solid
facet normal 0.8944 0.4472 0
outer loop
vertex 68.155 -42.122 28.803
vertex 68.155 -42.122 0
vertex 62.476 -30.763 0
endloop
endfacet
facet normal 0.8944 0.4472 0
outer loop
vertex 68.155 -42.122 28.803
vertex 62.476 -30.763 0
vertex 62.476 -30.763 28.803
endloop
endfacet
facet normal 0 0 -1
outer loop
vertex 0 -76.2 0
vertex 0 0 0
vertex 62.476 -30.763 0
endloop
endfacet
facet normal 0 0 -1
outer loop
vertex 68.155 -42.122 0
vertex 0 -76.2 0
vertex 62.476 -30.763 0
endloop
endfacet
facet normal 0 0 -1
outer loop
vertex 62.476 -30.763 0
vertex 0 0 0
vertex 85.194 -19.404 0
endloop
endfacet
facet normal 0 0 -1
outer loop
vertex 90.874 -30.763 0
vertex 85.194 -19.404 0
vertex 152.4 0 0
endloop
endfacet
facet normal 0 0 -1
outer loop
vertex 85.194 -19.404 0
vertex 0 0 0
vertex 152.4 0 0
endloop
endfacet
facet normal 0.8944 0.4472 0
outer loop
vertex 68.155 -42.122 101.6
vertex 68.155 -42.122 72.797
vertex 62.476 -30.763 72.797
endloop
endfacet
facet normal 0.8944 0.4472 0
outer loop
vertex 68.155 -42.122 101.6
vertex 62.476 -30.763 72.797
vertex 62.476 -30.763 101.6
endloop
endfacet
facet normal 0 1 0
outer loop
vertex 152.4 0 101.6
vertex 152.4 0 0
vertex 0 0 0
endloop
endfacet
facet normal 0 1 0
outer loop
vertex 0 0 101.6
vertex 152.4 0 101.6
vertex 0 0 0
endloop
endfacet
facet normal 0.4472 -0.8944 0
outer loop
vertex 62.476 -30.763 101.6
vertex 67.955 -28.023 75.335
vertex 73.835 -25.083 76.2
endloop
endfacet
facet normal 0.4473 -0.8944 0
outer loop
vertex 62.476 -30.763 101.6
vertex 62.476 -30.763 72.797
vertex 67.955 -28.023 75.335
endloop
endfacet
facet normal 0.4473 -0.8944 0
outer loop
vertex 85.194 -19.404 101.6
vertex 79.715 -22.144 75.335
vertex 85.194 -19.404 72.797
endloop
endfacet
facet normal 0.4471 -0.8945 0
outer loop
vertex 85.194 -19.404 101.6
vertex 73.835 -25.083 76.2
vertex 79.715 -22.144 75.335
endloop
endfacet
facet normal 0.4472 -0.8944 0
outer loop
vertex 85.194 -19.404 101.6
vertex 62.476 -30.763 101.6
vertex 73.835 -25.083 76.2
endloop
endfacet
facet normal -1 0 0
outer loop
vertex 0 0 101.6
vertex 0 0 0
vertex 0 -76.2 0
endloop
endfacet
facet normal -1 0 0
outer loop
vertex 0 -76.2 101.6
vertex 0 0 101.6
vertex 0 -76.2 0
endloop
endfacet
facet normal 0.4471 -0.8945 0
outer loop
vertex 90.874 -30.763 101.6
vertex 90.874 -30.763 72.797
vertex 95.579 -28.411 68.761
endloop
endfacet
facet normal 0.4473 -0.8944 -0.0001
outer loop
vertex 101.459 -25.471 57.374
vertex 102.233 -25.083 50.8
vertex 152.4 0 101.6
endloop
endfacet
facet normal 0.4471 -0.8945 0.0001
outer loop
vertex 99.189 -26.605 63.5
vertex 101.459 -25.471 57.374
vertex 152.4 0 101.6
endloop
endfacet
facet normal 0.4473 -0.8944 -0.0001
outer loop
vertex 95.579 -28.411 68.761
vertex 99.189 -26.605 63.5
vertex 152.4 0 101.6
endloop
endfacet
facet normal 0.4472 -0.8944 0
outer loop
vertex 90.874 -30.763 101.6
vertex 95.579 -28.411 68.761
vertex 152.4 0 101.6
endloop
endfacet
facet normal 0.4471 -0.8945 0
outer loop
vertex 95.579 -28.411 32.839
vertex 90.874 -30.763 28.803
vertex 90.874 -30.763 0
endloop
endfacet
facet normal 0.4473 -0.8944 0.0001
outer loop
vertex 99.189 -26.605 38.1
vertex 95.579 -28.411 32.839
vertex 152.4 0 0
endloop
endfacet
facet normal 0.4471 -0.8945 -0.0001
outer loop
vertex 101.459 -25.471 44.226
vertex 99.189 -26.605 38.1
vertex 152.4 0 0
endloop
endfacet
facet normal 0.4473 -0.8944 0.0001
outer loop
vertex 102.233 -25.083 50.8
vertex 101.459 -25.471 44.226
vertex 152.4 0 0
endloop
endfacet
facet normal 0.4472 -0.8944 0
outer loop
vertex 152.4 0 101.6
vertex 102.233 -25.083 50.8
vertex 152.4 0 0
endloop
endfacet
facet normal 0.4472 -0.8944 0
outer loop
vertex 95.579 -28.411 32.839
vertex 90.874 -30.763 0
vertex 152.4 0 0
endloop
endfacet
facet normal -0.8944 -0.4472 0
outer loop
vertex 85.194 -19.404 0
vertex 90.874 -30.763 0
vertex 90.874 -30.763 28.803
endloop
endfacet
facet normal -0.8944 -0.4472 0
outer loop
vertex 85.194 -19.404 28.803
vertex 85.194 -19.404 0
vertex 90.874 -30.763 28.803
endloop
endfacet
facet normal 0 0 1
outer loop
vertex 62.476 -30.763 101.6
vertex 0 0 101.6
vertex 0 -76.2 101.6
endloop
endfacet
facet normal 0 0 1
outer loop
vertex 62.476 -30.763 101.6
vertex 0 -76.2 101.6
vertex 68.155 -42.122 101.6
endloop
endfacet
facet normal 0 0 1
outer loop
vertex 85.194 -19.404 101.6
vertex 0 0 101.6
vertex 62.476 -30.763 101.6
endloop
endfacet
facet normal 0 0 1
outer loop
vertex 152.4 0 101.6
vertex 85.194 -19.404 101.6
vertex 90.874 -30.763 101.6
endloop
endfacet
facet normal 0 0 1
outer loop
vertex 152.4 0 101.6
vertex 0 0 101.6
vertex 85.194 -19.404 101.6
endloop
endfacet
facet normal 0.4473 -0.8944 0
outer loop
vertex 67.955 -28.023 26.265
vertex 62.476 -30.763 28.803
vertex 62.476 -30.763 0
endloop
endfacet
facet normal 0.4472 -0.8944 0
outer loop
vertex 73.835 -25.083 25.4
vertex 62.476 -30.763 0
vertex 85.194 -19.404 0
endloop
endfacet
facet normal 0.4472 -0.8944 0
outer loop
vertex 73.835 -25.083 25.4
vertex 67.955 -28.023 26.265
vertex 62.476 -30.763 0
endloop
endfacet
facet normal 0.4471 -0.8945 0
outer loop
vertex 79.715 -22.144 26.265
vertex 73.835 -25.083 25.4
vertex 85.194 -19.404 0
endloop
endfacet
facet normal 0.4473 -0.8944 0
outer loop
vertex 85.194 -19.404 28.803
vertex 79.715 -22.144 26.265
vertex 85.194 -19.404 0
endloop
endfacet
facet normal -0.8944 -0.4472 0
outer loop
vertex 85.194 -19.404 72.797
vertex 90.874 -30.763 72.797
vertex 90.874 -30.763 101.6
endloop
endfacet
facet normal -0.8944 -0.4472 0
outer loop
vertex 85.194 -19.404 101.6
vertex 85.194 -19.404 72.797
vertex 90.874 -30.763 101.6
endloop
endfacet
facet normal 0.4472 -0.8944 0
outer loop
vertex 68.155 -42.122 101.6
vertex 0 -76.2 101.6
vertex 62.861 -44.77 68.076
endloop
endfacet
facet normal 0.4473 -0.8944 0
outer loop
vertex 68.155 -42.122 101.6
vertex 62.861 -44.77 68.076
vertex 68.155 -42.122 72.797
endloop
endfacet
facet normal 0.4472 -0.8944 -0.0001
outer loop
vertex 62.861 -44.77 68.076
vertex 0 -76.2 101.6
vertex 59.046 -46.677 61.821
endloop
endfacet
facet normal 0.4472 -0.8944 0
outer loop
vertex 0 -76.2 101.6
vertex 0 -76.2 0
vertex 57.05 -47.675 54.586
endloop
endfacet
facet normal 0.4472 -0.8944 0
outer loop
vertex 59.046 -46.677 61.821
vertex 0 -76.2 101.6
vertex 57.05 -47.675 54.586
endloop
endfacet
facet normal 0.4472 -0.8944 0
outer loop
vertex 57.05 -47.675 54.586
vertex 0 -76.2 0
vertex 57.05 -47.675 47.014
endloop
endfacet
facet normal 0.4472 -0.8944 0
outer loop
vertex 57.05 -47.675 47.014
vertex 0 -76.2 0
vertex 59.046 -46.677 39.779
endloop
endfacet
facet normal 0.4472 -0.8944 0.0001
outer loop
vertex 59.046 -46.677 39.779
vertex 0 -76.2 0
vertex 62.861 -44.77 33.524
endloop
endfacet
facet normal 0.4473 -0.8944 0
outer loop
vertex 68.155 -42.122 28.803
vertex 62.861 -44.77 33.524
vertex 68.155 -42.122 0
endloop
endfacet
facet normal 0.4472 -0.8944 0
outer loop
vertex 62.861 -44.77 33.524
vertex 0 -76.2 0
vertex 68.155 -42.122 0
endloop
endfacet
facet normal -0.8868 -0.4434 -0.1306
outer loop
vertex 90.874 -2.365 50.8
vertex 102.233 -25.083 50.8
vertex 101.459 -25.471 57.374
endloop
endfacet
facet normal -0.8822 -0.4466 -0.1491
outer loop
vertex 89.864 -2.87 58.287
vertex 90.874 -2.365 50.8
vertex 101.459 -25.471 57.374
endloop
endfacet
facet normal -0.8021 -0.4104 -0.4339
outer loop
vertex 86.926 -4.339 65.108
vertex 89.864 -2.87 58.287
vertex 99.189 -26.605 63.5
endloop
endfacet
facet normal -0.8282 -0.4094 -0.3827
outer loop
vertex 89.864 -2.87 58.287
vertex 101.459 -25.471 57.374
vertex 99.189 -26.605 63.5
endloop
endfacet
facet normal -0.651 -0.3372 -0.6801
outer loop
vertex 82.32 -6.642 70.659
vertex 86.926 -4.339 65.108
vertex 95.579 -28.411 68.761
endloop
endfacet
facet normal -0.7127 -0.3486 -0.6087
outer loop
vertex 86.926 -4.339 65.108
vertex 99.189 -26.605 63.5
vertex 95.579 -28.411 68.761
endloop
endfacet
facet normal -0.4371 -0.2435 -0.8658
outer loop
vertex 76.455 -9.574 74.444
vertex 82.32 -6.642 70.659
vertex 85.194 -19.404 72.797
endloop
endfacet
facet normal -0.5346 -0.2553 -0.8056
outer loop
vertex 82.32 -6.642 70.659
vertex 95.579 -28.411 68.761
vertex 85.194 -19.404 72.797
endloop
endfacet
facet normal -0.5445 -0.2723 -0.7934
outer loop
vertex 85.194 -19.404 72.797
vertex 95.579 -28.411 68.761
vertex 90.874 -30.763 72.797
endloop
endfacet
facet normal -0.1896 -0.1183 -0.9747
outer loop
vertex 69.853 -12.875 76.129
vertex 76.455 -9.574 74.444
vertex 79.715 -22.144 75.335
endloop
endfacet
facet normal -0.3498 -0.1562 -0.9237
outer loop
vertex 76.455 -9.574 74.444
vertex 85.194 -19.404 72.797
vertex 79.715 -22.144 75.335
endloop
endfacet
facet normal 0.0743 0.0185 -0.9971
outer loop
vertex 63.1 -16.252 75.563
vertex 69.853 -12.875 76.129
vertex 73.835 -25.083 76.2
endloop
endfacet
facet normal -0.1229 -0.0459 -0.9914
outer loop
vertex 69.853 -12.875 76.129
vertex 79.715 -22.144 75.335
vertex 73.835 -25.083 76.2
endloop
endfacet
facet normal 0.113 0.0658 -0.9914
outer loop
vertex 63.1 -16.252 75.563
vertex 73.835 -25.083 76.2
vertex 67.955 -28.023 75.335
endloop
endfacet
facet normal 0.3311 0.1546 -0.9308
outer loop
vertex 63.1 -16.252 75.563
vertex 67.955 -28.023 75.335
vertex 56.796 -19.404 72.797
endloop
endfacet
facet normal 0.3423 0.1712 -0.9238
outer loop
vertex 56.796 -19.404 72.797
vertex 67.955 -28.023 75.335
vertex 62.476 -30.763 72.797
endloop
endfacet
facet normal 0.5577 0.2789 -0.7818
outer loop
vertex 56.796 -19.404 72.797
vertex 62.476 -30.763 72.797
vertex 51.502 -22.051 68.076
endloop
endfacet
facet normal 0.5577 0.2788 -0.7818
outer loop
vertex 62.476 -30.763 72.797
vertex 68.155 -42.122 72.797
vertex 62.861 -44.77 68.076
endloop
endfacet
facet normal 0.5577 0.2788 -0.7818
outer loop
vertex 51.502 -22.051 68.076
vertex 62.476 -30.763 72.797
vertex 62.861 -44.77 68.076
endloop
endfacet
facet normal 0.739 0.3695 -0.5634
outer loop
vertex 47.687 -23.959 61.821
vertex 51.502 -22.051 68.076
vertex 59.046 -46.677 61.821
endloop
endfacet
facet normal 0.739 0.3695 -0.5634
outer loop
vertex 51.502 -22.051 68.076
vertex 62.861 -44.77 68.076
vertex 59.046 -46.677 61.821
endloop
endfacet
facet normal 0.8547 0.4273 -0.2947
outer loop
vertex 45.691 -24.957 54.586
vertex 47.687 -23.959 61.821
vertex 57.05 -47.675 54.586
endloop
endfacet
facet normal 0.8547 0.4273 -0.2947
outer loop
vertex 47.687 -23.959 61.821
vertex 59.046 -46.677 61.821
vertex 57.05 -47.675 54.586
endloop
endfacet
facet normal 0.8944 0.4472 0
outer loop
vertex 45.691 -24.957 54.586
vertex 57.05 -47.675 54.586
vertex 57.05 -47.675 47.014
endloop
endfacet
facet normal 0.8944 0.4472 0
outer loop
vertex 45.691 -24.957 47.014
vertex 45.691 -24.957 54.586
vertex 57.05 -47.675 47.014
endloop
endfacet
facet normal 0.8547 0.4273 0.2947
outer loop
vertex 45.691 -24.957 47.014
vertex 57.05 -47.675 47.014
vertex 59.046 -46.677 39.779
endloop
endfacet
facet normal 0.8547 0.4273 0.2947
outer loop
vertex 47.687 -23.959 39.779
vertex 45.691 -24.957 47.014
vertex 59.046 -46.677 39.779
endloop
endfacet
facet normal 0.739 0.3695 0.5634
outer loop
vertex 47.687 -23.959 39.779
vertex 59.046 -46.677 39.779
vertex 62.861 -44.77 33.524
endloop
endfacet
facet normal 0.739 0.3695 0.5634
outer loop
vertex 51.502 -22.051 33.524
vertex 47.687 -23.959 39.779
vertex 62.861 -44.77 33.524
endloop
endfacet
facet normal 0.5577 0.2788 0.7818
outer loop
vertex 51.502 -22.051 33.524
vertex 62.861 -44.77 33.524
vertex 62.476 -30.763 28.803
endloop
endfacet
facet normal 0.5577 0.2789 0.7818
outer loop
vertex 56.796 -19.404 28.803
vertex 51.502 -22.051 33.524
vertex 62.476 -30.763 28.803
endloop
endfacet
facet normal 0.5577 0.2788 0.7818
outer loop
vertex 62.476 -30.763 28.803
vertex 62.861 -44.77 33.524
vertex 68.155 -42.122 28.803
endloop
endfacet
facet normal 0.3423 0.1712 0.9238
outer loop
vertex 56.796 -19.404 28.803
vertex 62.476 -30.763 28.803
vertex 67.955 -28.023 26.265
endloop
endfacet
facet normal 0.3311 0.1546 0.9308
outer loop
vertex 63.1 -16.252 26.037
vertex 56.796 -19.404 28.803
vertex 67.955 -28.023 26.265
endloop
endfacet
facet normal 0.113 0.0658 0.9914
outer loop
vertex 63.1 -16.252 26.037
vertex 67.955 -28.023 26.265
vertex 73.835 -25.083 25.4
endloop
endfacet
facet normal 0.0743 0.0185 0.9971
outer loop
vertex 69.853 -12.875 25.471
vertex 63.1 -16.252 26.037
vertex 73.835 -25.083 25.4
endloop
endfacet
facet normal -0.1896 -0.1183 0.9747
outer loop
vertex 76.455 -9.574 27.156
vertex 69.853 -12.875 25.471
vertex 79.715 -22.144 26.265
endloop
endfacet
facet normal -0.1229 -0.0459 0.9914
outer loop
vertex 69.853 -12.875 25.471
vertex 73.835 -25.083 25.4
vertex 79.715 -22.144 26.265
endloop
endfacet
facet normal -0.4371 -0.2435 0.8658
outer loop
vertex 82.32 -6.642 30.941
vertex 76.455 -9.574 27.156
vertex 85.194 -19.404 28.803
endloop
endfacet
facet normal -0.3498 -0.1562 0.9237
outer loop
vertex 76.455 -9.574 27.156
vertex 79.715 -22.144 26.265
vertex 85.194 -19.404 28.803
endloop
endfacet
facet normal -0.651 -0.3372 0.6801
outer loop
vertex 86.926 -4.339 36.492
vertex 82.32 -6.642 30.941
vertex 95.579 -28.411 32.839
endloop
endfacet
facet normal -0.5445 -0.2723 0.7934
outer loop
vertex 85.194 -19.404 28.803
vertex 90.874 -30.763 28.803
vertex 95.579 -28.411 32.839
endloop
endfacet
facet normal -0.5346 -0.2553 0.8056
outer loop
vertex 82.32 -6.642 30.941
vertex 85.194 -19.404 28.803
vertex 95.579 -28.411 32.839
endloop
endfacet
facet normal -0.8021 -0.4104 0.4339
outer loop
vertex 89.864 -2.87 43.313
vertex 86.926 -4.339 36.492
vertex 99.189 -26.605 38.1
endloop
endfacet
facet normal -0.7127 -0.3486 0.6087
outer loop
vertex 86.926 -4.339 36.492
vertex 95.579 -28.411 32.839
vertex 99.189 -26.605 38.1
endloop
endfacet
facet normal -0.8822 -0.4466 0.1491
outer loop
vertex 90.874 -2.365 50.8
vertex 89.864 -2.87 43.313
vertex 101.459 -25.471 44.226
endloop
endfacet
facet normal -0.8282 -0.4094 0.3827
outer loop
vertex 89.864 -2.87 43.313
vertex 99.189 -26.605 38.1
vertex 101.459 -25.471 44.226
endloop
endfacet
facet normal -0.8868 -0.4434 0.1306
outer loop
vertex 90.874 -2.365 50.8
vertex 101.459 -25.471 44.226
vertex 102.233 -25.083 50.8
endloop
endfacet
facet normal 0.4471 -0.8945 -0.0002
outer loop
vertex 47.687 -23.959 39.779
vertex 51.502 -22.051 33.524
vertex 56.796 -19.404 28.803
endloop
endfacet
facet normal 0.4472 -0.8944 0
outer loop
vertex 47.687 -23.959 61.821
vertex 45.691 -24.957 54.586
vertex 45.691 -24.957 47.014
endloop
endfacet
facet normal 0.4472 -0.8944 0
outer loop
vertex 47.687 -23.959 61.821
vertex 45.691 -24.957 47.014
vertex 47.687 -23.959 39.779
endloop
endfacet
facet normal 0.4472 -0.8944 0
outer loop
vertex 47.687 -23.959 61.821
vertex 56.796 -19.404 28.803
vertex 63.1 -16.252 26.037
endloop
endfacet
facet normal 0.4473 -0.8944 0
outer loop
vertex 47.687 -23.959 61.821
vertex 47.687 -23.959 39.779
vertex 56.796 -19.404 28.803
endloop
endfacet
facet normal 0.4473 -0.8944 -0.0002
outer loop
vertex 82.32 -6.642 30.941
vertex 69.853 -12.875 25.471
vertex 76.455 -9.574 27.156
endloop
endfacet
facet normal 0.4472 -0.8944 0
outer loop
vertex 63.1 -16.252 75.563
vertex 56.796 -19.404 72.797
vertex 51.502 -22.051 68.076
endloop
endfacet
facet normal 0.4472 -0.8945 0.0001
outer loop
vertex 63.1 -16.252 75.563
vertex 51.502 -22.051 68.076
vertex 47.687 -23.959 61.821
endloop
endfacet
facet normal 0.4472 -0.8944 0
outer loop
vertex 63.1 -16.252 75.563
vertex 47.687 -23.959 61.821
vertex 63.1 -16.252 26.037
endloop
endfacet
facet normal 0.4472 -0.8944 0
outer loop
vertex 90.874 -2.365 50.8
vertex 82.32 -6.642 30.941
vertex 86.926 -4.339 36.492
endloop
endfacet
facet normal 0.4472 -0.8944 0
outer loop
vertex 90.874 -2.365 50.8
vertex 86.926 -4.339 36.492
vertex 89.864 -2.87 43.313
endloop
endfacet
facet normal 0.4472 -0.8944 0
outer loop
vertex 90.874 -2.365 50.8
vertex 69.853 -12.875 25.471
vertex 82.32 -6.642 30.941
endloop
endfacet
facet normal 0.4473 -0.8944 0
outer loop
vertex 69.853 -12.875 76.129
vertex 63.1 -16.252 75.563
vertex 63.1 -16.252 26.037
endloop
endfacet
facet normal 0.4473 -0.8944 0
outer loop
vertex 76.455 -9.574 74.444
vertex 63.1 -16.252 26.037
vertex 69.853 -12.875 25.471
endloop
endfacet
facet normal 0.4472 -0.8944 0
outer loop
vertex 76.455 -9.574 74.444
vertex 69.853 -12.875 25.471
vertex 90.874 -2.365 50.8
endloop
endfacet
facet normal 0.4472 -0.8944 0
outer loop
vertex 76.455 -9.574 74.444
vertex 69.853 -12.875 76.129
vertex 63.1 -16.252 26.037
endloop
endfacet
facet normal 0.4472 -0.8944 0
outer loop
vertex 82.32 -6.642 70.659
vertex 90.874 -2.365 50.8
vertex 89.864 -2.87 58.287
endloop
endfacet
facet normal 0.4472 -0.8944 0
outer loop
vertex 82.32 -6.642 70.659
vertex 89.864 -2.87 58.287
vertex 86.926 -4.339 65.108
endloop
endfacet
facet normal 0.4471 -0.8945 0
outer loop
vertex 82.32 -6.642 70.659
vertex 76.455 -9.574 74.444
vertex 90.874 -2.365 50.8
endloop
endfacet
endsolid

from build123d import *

# Parameters (mm, degrees)
F1_DEPTH = 101.6
F2_W     = 25.4
F2_H     = 101.6
F3_DEPTH = 12.7
F5_DEPTH = 25.4


with BuildPart() as f1:
    # F0 (on Top) → F1 (new body)
    with BuildSketch(Plane.XY):
        Polygon((152.4, 0), (0, 0), (0, -76.2), align=None)
    extrude(amount=F1_DEPTH)

    # F2 (on face) → F3 (cut)
    with BuildSketch(Plane(origin=(30.48, -60.96, 0), x_dir=(0.894427191, 0.4472135955, 0), z_dir=(0.4472135955, -0.894427191, 0))):
        with Locations((54.8223240229, 50.8)):
            Rectangle(F2_W, F2_H)
    extrude(amount=-F3_DEPTH, mode=Mode.SUBTRACT)

    # F4 (on face) → F5 (cut)
    with BuildSketch(Plane(origin=(30.48, -60.96, 0), x_dir=(0.894427191, 0.4472135955, 0), z_dir=(0.4472135955, -0.894427191, 0))):
        with BuildLine():
            ThreePointArc((67.5223240229, 28.8029547439), (76.819369279, 38.1), (80.2223240229, 50.8))
            ThreePointArc((80.2223240229, 50.8), (76.819369279, 63.5), (67.5223240229, 72.7970452561))
            Line((67.5223240229, 72.7970452561), (67.5223240229, 28.8029547439))
        make_face()
        with BuildLine():
            Line((67.5223240229, 28.8029547439), (67.5223240229, 72.7970452561))
            ThreePointArc((67.5223240229, 72.7970452561), (29.4223240229, 50.8), (67.5223240229, 28.8029547439))
        make_face()
    extrude(amount=-F5_DEPTH, mode=Mode.SUBTRACT)


solid = f1.part
